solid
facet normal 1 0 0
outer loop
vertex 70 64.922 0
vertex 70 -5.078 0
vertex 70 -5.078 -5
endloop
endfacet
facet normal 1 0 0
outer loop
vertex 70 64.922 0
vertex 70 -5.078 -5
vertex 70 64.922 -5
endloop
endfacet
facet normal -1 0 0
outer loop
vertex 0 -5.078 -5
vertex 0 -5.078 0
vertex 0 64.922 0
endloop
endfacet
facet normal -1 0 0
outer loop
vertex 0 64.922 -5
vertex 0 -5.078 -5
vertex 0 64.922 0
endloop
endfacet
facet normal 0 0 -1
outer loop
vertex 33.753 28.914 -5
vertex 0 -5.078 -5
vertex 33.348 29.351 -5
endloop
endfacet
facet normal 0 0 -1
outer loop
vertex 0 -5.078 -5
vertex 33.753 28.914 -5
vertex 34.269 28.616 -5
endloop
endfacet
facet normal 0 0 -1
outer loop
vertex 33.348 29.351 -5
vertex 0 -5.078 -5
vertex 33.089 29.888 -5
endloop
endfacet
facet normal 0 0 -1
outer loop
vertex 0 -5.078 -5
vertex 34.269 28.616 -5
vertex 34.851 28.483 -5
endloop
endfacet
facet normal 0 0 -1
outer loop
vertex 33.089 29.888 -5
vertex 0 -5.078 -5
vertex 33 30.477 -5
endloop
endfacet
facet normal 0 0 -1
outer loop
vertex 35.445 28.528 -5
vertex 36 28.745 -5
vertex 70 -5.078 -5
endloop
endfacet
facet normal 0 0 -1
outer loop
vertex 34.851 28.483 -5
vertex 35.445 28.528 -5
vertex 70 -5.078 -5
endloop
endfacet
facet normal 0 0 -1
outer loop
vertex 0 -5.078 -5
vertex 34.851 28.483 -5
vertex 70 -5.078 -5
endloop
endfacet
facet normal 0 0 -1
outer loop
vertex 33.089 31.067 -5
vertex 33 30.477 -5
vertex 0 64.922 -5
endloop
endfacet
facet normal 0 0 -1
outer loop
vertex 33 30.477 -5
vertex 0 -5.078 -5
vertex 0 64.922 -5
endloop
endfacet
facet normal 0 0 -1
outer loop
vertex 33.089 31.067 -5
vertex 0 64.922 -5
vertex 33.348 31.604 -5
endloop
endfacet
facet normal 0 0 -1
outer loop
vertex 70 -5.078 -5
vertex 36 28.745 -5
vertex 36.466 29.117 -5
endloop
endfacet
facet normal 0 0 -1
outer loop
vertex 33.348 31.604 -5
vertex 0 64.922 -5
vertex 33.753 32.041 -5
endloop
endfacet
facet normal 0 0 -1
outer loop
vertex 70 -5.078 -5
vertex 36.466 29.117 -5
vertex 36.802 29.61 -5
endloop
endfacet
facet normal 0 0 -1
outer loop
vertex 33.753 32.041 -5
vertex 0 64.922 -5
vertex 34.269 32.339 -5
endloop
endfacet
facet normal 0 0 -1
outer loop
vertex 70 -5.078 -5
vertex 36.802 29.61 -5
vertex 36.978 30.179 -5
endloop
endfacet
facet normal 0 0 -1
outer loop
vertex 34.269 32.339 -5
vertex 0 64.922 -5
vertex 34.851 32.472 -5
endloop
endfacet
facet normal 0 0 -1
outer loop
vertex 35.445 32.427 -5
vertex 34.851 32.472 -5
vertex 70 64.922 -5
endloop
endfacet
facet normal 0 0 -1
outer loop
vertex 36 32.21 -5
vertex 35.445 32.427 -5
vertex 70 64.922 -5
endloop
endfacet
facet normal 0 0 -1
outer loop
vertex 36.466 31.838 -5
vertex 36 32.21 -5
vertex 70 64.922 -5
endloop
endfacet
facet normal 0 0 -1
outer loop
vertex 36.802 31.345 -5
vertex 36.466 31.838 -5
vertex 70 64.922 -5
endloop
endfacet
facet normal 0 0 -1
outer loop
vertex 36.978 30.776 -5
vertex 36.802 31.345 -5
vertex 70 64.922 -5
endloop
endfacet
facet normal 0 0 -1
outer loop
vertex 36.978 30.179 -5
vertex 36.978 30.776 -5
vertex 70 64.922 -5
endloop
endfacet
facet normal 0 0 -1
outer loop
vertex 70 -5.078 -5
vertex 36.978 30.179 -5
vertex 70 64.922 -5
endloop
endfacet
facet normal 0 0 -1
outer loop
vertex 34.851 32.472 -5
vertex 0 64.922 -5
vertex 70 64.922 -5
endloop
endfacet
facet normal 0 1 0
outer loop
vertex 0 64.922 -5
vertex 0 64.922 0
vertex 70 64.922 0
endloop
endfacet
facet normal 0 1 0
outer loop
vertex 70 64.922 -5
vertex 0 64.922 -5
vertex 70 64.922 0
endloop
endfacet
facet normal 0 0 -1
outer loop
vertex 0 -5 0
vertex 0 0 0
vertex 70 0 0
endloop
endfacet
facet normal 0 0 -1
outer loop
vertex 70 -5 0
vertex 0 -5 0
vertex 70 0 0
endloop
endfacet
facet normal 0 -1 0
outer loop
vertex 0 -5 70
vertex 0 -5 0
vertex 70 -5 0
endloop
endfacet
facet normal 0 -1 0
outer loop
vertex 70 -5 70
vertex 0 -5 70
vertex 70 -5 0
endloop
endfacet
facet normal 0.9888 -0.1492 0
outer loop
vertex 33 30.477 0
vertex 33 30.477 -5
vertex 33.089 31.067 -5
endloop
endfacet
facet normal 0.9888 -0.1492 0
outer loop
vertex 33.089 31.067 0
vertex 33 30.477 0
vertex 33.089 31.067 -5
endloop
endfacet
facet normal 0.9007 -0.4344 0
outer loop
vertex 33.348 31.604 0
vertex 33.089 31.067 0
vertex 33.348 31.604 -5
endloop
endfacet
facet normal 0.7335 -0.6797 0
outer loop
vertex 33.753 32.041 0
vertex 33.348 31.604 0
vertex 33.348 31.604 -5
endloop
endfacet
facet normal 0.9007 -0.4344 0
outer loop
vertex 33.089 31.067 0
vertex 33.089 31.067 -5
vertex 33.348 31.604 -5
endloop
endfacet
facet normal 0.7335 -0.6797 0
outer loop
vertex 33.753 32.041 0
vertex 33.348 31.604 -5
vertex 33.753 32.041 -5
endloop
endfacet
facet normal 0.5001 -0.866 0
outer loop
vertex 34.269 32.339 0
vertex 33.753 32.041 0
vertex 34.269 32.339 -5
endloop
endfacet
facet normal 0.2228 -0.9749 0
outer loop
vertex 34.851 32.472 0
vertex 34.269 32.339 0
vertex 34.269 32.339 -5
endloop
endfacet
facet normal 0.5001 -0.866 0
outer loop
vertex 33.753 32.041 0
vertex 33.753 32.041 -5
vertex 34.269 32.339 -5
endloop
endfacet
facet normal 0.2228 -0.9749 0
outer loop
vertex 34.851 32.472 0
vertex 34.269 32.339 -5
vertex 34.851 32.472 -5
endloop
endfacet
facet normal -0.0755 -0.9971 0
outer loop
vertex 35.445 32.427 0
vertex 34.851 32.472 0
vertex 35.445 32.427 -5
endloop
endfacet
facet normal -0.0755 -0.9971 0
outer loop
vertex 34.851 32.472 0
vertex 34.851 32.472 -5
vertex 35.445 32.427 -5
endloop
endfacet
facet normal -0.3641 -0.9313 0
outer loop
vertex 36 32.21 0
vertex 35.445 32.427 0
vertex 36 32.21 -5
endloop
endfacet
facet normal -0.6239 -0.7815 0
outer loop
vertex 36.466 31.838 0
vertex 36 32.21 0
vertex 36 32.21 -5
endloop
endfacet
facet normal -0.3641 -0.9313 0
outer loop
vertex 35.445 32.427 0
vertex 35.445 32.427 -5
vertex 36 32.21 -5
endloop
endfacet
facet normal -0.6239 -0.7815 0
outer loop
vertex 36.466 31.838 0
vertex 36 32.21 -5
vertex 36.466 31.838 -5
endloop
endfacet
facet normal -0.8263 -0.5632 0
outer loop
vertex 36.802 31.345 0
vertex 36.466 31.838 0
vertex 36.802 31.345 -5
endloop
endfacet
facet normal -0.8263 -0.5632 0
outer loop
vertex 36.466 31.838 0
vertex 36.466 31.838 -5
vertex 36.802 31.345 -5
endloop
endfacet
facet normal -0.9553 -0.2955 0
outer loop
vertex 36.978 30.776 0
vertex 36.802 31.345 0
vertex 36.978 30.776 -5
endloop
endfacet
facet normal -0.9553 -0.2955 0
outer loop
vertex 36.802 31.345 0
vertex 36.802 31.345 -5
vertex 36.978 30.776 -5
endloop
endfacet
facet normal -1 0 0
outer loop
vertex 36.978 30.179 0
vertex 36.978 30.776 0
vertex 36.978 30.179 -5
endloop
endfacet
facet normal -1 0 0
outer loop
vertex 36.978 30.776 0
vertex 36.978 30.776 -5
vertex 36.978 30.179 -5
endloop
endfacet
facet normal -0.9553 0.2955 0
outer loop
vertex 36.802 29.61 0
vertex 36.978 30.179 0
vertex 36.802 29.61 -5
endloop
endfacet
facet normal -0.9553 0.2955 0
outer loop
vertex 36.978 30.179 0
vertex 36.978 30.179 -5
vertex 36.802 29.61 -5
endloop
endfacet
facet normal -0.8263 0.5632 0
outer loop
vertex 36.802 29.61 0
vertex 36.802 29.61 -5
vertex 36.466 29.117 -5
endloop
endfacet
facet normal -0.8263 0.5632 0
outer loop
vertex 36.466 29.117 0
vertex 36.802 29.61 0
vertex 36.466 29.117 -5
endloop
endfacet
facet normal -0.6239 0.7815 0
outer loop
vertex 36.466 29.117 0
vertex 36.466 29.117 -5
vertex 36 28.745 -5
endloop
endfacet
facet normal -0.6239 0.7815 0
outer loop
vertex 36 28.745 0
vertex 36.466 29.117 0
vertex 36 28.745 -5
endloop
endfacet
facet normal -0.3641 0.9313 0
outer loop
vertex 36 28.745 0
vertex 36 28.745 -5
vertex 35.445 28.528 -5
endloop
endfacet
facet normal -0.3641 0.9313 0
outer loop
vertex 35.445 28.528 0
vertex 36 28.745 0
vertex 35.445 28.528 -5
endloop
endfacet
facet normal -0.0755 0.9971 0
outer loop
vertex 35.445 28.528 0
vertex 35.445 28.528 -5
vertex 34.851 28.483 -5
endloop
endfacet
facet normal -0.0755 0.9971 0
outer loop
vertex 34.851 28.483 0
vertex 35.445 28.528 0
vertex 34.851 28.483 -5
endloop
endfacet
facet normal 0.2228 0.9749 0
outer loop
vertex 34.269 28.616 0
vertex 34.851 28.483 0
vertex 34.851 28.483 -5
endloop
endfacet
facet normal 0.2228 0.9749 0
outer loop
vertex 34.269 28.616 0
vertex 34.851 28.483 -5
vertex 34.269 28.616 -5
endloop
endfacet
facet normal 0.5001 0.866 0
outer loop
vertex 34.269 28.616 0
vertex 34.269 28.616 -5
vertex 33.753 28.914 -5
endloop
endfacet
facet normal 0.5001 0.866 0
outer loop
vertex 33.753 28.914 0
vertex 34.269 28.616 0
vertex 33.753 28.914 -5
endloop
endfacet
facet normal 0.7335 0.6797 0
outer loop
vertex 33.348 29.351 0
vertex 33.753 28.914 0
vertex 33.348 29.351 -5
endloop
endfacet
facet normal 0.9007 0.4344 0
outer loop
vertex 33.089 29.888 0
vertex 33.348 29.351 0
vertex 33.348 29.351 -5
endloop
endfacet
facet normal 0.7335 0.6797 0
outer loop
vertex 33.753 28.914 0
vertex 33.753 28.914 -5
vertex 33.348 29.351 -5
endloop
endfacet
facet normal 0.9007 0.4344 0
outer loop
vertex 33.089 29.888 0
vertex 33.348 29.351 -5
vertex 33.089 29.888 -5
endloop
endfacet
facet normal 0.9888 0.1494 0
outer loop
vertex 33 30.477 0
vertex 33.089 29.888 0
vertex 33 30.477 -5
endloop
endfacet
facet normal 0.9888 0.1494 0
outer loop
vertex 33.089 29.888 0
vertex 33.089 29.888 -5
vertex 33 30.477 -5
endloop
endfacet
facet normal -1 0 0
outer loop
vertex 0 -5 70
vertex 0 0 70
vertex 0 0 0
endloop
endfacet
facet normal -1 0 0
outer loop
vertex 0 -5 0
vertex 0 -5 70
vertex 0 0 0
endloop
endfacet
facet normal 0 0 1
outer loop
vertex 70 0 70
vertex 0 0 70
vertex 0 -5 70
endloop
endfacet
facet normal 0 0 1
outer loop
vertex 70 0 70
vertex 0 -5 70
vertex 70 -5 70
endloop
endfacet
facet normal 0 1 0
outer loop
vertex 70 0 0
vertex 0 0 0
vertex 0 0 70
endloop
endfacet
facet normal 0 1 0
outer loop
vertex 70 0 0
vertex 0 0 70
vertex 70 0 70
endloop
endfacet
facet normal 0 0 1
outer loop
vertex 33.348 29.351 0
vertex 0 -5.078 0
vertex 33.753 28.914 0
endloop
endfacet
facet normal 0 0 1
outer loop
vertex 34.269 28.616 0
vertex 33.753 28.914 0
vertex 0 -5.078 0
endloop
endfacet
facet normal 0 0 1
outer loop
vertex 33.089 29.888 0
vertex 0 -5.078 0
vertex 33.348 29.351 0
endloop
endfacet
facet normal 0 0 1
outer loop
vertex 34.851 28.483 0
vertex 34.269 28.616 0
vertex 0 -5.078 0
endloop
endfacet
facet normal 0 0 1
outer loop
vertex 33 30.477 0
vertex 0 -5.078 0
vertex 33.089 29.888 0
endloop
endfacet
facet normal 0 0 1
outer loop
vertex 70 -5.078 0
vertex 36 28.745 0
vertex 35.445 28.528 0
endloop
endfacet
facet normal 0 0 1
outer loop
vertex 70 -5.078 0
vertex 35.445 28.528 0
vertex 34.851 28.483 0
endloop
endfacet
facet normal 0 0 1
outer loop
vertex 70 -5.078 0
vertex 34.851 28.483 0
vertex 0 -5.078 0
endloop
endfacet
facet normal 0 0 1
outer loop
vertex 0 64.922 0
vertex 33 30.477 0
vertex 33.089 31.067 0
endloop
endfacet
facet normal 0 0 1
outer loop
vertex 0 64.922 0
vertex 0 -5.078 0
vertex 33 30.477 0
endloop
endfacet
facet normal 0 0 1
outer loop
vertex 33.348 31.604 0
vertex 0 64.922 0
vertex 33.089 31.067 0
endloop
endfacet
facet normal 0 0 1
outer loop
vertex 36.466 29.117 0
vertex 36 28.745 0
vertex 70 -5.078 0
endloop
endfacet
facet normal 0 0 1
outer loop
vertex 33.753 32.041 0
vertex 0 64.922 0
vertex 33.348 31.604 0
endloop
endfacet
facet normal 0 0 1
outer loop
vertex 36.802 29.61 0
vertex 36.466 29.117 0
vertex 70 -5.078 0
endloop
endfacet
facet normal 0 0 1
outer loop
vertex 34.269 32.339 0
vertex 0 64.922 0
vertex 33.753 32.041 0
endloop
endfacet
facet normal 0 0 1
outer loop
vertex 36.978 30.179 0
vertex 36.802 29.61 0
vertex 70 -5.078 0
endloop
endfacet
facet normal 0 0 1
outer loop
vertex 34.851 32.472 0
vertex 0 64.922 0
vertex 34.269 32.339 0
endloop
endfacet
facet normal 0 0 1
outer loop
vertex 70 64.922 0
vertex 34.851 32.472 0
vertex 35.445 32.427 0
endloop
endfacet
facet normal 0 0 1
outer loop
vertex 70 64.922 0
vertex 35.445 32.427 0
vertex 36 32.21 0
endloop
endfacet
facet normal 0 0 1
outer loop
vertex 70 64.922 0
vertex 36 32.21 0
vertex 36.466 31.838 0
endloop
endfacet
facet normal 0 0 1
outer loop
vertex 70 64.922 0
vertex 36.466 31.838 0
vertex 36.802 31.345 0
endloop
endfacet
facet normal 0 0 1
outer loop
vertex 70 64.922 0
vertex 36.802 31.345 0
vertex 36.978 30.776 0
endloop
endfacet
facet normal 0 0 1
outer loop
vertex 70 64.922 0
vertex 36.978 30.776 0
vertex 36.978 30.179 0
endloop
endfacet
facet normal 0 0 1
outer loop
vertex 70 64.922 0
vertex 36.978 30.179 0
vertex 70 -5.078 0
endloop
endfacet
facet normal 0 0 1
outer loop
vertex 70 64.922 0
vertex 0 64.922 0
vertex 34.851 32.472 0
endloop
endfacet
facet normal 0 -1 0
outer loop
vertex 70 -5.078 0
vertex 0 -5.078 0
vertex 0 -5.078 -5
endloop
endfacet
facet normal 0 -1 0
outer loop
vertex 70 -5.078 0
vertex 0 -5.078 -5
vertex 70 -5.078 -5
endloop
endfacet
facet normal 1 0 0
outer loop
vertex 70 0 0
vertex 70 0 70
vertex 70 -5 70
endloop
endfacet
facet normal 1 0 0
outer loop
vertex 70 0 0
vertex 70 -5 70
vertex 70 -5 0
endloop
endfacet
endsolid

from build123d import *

# Parameters (mm, degrees)
SKETCH2_W           = 70
SKETCH2_H           = 70
BOSS_EXTRUDE1_DEPTH = 5
SKETCH1_W           = 70
SKETCH1_H           = 70
BOSS_EXTRUDE2_DEPTH = 5
SKETCH5_R           = 2
CUT_EXTRUDE1_DEPTH  = 5


with BuildPart() as part:
    # Sketch2 → Boss-Extrude1 (new body)
    with BuildSketch(Plane(origin=(0, -5.078485025, 0), x_dir=(1, 0, 0), z_dir=(0, 0, 1))):
        with Locations((35, 35)):
            Rectangle(SKETCH2_W, SKETCH2_H)
    extrude(amount=-BOSS_EXTRUDE1_DEPTH)

    # Sketch5 → Cut-Extrude1 (cut)
    with BuildSketch(Plane(origin=(0, 0, -5), x_dir=(-1, 0, 0), z_dir=(0, 0, -1))):
        with Locations((-35, 30.477465887)):
            Circle(SKETCH5_R)
    extrude(amount=-CUT_EXTRUDE1_DEPTH, mode=Mode.SUBTRACT)


with BuildPart() as body_2:
    # Sketch1 → Boss-Extrude2 (new body)
    with BuildSketch(Plane(origin=(0, 0, 0), x_dir=(1, 0, 0), z_dir=(0, 1, 0))):
        with Locations((35, -35)):
            Rectangle(SKETCH1_W, SKETCH1_H)
    extrude(amount=-BOSS_EXTRUDE2_DEPTH)


solid = Compound([part.part, body_2.part])
